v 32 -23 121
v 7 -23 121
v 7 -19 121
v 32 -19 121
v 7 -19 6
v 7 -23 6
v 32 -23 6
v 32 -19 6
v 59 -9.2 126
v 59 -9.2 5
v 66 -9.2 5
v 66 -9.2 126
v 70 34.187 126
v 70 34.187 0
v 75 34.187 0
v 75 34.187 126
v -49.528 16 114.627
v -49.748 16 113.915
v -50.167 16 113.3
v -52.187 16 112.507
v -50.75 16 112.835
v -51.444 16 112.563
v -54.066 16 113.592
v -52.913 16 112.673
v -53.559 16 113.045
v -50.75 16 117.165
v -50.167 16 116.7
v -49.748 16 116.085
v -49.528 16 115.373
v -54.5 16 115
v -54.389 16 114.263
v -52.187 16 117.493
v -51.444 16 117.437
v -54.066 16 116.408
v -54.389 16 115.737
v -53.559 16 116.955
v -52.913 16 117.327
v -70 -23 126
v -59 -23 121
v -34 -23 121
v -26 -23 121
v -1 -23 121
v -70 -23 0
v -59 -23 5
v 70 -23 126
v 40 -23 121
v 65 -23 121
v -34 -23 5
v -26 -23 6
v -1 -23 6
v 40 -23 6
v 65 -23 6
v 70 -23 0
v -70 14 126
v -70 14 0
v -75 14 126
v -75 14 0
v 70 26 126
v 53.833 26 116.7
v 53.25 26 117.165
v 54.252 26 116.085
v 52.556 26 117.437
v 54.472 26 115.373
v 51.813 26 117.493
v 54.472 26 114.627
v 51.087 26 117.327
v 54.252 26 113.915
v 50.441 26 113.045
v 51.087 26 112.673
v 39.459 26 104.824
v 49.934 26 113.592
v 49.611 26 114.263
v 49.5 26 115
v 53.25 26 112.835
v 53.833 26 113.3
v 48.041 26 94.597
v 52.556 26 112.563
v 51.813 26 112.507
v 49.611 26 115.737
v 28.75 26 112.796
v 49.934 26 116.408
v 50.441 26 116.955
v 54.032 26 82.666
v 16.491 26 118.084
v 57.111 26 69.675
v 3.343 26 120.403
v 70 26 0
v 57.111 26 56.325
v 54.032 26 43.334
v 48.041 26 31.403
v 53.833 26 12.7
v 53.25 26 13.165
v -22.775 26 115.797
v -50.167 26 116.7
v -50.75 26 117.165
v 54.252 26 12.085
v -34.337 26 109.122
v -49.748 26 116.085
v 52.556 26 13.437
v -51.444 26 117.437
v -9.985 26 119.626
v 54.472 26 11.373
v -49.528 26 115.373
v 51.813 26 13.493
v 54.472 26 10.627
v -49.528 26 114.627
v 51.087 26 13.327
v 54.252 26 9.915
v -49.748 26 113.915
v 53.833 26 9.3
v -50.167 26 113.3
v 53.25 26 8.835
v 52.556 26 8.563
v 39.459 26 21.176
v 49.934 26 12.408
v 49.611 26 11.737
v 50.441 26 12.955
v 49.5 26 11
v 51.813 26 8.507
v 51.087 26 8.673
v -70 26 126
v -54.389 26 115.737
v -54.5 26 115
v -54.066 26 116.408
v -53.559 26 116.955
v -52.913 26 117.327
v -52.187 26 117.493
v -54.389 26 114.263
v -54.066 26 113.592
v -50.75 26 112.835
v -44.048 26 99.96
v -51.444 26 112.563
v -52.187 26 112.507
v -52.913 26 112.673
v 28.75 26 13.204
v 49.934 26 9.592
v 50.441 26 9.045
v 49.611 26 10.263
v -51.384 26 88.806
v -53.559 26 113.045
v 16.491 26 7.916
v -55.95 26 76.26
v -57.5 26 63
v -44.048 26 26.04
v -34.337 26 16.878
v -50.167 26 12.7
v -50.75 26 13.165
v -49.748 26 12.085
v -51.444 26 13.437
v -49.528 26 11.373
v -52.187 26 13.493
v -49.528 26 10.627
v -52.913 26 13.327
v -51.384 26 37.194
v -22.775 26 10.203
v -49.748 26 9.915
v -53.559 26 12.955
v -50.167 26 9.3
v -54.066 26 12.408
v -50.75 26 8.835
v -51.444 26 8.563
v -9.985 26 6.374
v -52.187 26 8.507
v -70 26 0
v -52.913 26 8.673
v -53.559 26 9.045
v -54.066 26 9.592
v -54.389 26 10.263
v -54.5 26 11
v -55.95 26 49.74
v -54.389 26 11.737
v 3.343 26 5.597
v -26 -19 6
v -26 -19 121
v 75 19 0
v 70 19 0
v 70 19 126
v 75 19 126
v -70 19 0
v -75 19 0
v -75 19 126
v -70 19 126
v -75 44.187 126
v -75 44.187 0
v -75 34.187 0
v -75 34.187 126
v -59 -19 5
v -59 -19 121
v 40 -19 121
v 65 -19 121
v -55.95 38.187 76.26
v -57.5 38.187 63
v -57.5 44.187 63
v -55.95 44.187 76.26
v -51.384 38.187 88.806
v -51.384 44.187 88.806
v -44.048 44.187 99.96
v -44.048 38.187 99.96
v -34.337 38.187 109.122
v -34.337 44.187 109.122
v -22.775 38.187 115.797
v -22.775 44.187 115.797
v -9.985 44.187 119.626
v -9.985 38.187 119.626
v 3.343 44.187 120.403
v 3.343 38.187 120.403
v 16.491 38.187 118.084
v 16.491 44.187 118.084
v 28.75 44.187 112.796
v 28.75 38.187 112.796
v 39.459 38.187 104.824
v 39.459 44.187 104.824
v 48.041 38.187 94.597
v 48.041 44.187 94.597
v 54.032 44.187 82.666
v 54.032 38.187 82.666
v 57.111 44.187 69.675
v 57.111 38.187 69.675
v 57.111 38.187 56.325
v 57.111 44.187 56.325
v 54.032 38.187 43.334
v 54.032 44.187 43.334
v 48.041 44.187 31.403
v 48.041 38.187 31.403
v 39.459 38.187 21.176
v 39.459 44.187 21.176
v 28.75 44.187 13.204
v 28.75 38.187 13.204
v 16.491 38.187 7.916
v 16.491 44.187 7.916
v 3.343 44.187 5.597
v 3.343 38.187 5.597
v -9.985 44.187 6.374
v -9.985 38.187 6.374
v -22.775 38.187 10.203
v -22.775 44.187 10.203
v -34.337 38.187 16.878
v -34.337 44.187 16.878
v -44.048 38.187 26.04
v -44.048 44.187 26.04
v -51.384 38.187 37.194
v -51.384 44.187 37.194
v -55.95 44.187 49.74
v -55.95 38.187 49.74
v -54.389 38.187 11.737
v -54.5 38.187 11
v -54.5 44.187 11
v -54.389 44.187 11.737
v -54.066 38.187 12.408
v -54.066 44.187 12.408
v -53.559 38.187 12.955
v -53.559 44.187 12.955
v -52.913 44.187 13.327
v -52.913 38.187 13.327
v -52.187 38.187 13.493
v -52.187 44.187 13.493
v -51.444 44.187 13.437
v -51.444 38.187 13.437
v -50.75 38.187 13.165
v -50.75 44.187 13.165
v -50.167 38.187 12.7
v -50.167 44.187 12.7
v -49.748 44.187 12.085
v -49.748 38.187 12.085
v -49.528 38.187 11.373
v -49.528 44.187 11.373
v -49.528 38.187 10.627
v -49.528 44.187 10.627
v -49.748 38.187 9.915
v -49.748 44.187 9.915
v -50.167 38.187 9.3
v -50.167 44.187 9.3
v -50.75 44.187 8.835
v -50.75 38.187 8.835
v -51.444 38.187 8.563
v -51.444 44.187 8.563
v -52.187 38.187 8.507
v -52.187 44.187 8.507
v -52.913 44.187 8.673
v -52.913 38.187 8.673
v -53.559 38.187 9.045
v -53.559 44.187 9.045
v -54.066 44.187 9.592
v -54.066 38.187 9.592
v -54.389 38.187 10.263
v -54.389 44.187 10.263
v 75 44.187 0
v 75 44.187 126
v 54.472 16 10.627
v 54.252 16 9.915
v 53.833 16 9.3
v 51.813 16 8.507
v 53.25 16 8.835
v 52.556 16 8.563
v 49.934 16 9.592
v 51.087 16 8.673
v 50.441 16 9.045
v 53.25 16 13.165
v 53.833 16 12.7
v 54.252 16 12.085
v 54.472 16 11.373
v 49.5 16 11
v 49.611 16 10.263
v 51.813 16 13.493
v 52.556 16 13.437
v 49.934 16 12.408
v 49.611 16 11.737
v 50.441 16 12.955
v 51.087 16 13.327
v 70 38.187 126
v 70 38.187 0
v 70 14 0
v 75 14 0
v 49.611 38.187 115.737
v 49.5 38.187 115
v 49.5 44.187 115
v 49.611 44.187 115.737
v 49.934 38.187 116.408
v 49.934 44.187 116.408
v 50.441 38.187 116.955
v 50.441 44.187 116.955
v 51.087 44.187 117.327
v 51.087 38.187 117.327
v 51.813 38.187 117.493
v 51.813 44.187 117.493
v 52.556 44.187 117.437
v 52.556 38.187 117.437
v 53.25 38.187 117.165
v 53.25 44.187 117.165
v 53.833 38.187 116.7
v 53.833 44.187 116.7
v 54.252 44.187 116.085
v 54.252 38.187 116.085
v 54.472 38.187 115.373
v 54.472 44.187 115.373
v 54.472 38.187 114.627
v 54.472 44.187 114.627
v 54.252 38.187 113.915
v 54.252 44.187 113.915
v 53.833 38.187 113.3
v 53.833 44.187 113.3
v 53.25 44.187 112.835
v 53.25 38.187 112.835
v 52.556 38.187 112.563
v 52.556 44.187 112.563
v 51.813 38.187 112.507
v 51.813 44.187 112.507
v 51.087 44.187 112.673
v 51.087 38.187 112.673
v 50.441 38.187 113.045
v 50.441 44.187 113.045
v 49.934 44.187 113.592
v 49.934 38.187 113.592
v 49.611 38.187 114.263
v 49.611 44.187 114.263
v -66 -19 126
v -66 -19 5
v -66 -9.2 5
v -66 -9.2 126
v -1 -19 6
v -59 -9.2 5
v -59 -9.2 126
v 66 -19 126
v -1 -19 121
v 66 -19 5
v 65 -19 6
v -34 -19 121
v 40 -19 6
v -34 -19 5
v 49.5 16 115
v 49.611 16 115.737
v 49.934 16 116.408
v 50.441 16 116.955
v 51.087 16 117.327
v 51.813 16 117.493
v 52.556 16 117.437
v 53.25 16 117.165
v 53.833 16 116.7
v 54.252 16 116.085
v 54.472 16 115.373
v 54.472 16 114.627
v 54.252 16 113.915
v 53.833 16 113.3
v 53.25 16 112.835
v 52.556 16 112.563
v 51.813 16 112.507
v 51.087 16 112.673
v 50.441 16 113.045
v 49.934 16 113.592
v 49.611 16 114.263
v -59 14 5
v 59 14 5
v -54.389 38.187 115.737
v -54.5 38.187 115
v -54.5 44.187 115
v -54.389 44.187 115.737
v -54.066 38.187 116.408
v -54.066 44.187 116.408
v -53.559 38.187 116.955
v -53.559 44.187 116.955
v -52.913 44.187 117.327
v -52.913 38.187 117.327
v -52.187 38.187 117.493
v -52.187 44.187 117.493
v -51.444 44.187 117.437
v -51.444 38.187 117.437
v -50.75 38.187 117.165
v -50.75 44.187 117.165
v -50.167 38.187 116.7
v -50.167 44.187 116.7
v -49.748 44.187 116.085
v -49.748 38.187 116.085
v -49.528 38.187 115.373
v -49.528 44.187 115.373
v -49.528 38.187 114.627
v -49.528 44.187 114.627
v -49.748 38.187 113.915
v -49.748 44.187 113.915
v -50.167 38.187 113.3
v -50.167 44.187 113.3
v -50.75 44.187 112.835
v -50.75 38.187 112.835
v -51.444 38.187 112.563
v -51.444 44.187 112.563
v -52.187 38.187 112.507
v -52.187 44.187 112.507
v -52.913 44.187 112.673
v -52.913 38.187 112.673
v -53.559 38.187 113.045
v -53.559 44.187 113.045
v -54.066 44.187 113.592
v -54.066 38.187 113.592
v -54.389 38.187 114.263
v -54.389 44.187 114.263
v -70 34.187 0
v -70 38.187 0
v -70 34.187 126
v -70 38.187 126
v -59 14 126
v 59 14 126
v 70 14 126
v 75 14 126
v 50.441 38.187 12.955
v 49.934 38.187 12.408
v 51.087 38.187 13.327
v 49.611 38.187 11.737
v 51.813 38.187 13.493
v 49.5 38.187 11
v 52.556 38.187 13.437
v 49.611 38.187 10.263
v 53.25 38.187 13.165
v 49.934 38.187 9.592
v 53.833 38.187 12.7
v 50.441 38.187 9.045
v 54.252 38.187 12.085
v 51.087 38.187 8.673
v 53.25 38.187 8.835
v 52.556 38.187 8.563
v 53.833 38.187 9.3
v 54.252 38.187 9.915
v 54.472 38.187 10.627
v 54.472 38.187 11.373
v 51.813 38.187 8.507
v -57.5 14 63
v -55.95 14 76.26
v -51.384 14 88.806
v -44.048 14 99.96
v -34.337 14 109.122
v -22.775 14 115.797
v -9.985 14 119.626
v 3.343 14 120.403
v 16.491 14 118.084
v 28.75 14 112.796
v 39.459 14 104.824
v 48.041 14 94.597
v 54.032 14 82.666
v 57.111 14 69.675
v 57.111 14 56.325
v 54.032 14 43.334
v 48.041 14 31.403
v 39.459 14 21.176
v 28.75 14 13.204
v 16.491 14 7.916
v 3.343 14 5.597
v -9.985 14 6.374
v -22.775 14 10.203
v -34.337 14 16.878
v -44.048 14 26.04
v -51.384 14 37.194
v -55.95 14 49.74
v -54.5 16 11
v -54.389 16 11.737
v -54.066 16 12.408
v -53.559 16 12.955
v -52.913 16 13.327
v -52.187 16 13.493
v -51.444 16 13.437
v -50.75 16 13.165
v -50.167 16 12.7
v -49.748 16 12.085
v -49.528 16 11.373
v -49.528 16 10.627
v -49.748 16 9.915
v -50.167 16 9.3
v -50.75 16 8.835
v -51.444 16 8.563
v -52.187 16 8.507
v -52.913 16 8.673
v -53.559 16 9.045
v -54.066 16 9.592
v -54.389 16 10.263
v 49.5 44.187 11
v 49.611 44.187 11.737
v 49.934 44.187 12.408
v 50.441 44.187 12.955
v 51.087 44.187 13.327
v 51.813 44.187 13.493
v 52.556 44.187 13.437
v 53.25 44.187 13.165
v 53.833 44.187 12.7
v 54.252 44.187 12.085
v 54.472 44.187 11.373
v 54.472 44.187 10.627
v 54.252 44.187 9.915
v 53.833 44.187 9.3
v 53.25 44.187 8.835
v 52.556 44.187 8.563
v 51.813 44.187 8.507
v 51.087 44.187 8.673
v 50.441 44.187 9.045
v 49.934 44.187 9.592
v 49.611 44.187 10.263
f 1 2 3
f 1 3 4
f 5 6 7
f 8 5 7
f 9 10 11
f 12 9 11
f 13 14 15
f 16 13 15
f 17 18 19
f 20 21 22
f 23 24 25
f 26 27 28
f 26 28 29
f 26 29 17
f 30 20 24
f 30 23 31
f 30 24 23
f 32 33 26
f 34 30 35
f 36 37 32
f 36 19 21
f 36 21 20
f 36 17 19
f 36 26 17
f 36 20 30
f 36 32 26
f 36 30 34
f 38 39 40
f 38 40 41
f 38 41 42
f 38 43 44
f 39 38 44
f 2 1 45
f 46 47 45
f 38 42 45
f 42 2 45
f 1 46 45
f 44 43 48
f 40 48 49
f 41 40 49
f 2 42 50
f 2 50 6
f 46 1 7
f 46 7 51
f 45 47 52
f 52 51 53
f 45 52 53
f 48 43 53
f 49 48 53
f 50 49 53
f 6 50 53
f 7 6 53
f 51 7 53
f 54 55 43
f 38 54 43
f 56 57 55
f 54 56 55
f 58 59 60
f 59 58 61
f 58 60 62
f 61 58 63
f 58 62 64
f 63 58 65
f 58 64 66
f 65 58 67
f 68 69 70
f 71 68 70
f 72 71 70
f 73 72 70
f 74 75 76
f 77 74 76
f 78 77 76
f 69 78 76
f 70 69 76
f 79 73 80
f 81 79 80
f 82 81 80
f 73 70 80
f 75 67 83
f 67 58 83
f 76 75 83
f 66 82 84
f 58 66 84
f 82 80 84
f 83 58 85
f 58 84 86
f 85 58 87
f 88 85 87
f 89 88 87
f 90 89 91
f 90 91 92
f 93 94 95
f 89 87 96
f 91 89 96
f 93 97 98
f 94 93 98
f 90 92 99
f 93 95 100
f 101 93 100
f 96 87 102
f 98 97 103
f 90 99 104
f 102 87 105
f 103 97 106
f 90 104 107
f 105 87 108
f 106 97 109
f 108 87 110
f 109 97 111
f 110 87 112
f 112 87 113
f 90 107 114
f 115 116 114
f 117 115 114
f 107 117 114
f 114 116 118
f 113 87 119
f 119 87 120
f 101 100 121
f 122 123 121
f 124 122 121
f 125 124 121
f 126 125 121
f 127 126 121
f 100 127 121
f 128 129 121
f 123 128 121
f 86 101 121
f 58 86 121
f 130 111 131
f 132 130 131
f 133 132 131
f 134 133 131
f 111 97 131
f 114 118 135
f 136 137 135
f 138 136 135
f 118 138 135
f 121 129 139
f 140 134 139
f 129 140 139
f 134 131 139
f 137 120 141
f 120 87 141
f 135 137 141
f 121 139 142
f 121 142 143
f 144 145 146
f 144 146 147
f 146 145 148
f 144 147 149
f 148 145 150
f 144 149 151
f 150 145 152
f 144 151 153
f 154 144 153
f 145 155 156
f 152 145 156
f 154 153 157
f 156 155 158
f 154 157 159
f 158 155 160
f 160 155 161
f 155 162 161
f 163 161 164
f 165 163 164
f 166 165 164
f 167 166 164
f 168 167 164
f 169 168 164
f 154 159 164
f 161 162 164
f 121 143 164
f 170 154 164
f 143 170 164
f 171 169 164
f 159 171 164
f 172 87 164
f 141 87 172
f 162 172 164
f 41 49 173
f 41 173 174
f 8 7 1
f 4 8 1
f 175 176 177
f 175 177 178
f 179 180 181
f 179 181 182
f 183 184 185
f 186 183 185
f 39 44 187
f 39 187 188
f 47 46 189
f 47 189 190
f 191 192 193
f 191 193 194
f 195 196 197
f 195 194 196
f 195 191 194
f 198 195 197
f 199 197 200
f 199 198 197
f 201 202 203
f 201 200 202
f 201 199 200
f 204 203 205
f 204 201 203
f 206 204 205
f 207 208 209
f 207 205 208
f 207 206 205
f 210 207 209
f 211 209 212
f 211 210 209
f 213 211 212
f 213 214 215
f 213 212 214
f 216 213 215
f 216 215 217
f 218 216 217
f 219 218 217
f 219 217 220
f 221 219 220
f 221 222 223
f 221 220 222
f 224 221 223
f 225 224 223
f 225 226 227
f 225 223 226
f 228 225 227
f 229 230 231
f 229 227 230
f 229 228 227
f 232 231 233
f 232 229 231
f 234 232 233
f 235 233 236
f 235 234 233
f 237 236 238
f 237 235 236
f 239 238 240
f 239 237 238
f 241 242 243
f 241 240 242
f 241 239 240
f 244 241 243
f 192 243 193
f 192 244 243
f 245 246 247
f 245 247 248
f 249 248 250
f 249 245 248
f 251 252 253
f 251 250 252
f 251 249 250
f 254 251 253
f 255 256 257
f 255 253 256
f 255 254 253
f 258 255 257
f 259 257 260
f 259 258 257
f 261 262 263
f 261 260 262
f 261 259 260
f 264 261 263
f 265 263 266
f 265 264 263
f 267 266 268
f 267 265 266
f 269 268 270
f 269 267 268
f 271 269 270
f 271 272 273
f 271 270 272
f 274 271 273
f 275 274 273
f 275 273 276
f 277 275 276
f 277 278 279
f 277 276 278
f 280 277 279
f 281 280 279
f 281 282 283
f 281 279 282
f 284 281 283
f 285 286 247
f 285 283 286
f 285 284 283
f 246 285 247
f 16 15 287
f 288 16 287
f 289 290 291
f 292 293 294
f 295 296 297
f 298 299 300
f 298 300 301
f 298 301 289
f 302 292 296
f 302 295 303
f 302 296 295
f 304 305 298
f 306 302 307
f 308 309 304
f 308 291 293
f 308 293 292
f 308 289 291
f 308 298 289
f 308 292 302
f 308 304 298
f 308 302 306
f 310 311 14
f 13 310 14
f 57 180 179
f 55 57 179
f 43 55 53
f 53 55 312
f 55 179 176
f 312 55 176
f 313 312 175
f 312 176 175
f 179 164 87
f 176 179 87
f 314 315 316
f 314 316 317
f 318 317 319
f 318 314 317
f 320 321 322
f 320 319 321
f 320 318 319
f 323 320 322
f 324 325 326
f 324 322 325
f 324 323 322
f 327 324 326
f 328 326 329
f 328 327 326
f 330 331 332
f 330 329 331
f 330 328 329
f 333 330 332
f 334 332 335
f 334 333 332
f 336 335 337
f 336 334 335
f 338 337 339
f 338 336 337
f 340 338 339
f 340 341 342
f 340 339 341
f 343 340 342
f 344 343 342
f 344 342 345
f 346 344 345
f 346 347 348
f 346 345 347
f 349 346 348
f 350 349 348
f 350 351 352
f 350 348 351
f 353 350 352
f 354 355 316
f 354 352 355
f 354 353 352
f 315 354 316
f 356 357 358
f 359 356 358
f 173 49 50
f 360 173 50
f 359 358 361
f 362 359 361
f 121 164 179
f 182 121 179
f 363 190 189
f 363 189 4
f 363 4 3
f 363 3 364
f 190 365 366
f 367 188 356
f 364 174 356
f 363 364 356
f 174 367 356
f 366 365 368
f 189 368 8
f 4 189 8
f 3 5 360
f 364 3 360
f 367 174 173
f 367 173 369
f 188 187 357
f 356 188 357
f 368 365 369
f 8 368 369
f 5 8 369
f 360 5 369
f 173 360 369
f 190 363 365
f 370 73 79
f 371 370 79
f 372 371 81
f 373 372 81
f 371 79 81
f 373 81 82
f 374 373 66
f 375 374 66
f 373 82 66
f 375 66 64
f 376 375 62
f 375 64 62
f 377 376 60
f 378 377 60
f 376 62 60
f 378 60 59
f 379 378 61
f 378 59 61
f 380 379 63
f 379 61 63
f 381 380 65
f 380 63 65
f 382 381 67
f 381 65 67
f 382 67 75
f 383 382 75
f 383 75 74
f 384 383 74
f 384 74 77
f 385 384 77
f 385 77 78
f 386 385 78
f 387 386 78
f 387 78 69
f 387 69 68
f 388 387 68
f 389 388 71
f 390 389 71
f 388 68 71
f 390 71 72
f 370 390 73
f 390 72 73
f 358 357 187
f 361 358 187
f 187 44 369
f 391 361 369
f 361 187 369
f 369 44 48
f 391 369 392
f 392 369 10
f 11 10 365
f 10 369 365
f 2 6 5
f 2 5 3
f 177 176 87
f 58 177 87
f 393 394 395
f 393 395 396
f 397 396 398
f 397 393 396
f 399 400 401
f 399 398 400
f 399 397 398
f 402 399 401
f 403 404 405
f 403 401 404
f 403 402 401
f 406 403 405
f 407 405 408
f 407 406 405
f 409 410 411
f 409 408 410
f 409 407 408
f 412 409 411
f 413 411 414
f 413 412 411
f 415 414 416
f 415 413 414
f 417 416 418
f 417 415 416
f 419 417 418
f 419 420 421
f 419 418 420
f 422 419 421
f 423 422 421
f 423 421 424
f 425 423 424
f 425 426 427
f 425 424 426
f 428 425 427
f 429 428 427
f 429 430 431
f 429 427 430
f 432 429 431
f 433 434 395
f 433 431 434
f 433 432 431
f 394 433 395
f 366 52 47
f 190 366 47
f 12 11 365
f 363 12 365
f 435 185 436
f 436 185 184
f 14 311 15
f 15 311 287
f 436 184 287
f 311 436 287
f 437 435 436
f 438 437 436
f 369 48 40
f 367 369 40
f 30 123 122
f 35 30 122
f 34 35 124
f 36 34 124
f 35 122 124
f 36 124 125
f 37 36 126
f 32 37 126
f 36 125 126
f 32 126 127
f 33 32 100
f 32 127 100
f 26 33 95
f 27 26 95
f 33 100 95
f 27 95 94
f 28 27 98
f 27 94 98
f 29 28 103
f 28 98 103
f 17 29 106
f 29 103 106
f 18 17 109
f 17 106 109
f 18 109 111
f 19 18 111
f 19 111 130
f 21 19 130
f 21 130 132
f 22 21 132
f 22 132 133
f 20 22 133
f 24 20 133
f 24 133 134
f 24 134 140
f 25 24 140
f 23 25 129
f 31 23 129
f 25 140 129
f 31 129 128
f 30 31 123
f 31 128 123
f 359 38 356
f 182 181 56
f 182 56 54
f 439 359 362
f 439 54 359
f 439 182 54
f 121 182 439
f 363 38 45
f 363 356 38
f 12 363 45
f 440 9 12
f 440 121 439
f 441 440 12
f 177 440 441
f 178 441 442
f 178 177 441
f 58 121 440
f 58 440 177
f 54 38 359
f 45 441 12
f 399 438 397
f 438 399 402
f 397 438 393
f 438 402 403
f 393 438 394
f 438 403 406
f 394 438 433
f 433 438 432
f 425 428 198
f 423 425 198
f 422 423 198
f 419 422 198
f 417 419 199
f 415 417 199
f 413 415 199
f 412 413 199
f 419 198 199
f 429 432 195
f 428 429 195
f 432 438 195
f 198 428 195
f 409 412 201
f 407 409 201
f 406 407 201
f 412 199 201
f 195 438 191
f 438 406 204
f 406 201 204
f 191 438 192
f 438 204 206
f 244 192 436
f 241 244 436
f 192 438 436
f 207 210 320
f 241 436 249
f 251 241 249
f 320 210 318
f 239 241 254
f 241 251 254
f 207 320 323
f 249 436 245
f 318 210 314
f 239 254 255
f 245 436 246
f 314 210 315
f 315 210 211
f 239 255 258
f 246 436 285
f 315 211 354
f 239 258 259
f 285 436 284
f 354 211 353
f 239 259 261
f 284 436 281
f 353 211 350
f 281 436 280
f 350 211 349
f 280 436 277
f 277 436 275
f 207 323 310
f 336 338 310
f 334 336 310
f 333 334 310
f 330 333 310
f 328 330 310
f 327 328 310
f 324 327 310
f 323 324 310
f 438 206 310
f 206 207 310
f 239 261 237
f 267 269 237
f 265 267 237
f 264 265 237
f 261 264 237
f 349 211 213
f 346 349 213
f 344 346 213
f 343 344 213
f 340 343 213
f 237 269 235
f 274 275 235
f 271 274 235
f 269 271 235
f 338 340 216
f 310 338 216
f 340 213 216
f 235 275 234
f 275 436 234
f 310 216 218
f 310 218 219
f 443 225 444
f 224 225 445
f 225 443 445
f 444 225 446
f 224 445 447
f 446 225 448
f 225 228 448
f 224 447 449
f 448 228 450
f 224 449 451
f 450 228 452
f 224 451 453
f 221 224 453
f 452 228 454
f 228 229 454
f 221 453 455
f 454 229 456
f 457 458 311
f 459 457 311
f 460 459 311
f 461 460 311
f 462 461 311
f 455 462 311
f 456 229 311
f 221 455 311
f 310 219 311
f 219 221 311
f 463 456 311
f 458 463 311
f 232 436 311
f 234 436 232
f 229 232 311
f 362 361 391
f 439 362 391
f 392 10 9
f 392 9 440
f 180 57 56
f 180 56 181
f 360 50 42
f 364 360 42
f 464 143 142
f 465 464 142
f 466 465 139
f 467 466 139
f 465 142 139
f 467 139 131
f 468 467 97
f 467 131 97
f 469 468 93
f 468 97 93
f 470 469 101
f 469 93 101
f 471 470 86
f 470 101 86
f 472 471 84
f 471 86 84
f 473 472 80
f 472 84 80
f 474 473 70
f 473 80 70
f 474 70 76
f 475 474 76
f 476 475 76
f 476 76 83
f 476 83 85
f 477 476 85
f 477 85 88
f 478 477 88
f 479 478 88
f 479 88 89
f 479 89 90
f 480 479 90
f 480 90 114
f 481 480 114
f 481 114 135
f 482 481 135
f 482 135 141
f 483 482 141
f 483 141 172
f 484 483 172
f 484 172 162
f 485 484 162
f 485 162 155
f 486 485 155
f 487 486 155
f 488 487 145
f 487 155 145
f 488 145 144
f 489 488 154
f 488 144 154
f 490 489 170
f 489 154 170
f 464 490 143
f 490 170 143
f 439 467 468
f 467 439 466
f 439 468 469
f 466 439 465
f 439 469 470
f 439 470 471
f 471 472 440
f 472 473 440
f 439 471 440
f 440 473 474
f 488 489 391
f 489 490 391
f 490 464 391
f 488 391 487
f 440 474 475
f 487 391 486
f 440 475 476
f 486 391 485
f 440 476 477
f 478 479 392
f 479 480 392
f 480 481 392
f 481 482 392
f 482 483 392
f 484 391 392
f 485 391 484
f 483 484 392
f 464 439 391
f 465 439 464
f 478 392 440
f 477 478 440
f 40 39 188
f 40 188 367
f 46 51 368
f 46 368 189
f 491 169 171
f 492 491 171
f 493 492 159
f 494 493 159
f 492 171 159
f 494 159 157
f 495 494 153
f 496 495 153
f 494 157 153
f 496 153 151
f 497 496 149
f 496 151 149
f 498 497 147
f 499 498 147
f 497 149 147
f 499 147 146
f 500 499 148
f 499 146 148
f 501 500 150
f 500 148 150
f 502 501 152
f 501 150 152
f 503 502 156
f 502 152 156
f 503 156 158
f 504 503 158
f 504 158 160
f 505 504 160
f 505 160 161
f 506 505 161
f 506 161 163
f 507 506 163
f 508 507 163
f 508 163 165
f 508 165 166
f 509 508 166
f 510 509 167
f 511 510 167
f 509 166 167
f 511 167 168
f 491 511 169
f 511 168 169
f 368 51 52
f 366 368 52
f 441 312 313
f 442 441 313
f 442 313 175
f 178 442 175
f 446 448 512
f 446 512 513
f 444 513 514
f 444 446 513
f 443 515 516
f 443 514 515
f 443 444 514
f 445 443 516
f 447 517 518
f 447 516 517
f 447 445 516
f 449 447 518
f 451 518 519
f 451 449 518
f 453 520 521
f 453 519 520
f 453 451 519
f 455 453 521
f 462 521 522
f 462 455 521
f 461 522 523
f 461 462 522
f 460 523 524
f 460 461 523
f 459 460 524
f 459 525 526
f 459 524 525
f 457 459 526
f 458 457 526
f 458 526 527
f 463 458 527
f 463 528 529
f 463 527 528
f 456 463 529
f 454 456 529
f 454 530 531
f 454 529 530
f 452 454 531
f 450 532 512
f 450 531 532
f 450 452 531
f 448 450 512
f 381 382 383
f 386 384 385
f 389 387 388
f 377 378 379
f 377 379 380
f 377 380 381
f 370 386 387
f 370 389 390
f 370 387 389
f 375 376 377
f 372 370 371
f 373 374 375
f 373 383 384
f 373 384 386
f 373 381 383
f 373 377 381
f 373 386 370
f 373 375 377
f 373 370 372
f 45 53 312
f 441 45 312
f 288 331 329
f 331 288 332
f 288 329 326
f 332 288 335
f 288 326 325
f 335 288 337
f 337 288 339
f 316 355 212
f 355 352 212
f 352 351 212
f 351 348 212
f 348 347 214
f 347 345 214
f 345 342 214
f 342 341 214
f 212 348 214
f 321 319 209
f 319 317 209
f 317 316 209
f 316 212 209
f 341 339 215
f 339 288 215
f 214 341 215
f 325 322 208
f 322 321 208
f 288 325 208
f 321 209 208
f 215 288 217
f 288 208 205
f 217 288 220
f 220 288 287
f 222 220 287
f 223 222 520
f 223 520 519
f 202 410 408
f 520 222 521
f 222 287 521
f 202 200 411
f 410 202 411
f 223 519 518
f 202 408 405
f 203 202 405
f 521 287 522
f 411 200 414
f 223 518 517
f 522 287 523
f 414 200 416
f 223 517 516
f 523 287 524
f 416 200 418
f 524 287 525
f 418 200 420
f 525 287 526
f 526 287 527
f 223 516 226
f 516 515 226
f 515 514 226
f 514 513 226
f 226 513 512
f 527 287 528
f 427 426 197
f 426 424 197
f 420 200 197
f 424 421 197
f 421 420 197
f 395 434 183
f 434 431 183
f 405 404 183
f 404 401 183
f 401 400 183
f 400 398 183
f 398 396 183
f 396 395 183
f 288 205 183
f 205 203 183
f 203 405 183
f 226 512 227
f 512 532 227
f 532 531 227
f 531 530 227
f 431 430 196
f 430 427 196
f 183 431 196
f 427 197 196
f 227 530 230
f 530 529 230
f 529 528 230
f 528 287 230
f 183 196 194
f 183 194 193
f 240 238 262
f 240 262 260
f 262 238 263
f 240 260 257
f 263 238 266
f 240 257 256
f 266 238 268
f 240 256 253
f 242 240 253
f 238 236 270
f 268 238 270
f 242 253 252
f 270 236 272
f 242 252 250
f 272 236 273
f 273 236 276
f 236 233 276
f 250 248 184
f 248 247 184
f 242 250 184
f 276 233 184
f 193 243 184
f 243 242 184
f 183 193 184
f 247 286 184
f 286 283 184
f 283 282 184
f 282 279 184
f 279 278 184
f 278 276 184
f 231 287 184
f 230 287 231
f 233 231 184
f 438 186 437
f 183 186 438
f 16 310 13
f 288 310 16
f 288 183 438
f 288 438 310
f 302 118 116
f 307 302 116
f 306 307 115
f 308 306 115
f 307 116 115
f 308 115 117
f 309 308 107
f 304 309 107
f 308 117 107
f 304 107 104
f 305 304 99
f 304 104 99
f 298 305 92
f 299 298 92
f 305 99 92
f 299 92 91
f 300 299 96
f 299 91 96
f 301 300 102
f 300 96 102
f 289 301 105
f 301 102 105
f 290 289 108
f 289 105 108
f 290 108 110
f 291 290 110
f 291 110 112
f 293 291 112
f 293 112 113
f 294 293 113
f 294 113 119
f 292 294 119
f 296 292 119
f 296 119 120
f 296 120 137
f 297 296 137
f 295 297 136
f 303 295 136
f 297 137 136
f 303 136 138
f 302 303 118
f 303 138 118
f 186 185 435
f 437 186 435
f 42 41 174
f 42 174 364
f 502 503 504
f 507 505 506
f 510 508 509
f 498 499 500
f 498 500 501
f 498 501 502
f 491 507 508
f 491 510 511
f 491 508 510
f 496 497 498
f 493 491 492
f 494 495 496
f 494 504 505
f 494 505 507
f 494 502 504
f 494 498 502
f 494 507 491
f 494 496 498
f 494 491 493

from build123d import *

# Parameters (mm, degrees)
F0_W          = 7
F0_H          = 23.2
F0_W_2        = 5
F0_H_2        = 5
F1_DEPTH      = 126
F2_W          = 25
F2_H          = 116
F2_H_2        = 115
F3_DEPTH      = 6
F4_R          = 57.5
F5_DEPTH      = 35
F5_DEPTH_BACK = 25
F6_DEPTH      = 5
F7_R          = 2.5
F8_DEPTH      = 10
F8_DEPTH_BACK = 25


with BuildPart() as f1:
    # F0 (on Top) → F1 (new body)
    with BuildSketch(Plane.XY):
        Polygon((70, 26), (-70, 26), (-70, 19), (-70, 14), (-70, -23), (70, -23), (70, 14), (70, 19), align=None)
        Polygon((-66, -9.2), (-66, 14), (-59, 14), (59, 14), (66, 14), (66, -9.2), (66, -19), (-66, -19), align=None, mode=Mode.SUBTRACT)
        with Locations((-62.5, 2.4)):
            Rectangle(F0_W, F0_H)
        with Locations((62.5, 2.4)):
            Rectangle(F0_W, F0_H)
        with Locations((-72.5, 16.5)):
            Rectangle(F0_W_2, F0_H_2)
        with Locations((72.5, 16.5)):
            Rectangle(F0_W_2, F0_H_2)
    extrude(amount=F1_DEPTH)

    # F2 (on face) → F3 (cut)
    with BuildSketch(Plane.XZ.offset(23)):
        with Locations((-46.5, 63)):
            Rectangle(F2_W, F2_H)
        with Locations((-13.5, 63.5)):
            Rectangle(F2_W, F2_H_2)
        with Locations((19.5, 63.5)):
            Rectangle(F2_W, F2_H_2)
        with Locations((52.5, 63.5)):
            Rectangle(F2_W, F2_H_2)
    extrude(amount=-F3_DEPTH, mode=Mode.SUBTRACT)


with BuildPart() as f1b:
    # F0 (on Top) → F1, piece 2 (new body)
    with BuildSketch(Plane.XY):
        Polygon((70, 34.1871231794), (75, 34.1871231794), (75, 44.1871231794), (-75, 44.1871231794), (-75, 34.1871231794), (-70, 34.1871231794), (-70, 38.1871231794), (70, 38.1871231794), align=None)
    extrude(amount=F1_DEPTH)


with BuildPart() as f5_tool:
    # F4 (on face) → F5 (new body, two sides)
    with BuildSketch(Plane(origin=(0, 26, 0), x_dir=(-1, 0, 0), z_dir=(0, 1, 0))) as f5_sk:
        with Locations((0, 63)):
            Circle(F4_R)
    extrude(amount=-F5_DEPTH)
    extrude(f5_sk.sketch, amount=F5_DEPTH_BACK)


with BuildPart() as f1_1:
    add(f1.part)

    # F5: cut by f5_tool
    add(f5_tool.part, mode=Mode.SUBTRACT)

    # F0 (on Top) → F6 (join)
    with BuildSketch(Plane.XY):
        Polygon((59, 14), (-59, 14), (-59, -9.2), (-66, -9.2), (-66, -19), (66, -19), (66, -9.2), (59, -9.2), align=None)
    extrude(amount=F6_DEPTH)


with BuildPart() as f1b_1:
    add(f1b.part)

    # F5: cut by f5_tool
    add(f5_tool.part, mode=Mode.SUBTRACT)


with BuildPart() as f8_tool:
    # F7 (on face) → F8 (new body, two sides)
    with BuildSketch(Plane(origin=(0, 26, 0), x_dir=(-1, 0, 0), z_dir=(0, 1, 0))) as f8_sk:
        with Locations((-52, 11)):
            Circle(F7_R)
        with Locations((52, 11)):
            Circle(F7_R)
        with Locations((52, 115)):
            Circle(F7_R)
        with Locations((-52, 115)):
            Circle(F7_R)
    extrude(amount=-F8_DEPTH)
    extrude(f8_sk.sketch, amount=F8_DEPTH_BACK)


with BuildPart() as f1_2:
    add(f1_1.part)

    # F8: cut by f8_tool
    add(f8_tool.part, mode=Mode.SUBTRACT)


with BuildPart() as f1b_2:
    add(f1b_1.part)

    # F8: cut by f8_tool
    add(f8_tool.part, mode=Mode.SUBTRACT)


solid = Compound([f1_2.part, f1b_2.part])
